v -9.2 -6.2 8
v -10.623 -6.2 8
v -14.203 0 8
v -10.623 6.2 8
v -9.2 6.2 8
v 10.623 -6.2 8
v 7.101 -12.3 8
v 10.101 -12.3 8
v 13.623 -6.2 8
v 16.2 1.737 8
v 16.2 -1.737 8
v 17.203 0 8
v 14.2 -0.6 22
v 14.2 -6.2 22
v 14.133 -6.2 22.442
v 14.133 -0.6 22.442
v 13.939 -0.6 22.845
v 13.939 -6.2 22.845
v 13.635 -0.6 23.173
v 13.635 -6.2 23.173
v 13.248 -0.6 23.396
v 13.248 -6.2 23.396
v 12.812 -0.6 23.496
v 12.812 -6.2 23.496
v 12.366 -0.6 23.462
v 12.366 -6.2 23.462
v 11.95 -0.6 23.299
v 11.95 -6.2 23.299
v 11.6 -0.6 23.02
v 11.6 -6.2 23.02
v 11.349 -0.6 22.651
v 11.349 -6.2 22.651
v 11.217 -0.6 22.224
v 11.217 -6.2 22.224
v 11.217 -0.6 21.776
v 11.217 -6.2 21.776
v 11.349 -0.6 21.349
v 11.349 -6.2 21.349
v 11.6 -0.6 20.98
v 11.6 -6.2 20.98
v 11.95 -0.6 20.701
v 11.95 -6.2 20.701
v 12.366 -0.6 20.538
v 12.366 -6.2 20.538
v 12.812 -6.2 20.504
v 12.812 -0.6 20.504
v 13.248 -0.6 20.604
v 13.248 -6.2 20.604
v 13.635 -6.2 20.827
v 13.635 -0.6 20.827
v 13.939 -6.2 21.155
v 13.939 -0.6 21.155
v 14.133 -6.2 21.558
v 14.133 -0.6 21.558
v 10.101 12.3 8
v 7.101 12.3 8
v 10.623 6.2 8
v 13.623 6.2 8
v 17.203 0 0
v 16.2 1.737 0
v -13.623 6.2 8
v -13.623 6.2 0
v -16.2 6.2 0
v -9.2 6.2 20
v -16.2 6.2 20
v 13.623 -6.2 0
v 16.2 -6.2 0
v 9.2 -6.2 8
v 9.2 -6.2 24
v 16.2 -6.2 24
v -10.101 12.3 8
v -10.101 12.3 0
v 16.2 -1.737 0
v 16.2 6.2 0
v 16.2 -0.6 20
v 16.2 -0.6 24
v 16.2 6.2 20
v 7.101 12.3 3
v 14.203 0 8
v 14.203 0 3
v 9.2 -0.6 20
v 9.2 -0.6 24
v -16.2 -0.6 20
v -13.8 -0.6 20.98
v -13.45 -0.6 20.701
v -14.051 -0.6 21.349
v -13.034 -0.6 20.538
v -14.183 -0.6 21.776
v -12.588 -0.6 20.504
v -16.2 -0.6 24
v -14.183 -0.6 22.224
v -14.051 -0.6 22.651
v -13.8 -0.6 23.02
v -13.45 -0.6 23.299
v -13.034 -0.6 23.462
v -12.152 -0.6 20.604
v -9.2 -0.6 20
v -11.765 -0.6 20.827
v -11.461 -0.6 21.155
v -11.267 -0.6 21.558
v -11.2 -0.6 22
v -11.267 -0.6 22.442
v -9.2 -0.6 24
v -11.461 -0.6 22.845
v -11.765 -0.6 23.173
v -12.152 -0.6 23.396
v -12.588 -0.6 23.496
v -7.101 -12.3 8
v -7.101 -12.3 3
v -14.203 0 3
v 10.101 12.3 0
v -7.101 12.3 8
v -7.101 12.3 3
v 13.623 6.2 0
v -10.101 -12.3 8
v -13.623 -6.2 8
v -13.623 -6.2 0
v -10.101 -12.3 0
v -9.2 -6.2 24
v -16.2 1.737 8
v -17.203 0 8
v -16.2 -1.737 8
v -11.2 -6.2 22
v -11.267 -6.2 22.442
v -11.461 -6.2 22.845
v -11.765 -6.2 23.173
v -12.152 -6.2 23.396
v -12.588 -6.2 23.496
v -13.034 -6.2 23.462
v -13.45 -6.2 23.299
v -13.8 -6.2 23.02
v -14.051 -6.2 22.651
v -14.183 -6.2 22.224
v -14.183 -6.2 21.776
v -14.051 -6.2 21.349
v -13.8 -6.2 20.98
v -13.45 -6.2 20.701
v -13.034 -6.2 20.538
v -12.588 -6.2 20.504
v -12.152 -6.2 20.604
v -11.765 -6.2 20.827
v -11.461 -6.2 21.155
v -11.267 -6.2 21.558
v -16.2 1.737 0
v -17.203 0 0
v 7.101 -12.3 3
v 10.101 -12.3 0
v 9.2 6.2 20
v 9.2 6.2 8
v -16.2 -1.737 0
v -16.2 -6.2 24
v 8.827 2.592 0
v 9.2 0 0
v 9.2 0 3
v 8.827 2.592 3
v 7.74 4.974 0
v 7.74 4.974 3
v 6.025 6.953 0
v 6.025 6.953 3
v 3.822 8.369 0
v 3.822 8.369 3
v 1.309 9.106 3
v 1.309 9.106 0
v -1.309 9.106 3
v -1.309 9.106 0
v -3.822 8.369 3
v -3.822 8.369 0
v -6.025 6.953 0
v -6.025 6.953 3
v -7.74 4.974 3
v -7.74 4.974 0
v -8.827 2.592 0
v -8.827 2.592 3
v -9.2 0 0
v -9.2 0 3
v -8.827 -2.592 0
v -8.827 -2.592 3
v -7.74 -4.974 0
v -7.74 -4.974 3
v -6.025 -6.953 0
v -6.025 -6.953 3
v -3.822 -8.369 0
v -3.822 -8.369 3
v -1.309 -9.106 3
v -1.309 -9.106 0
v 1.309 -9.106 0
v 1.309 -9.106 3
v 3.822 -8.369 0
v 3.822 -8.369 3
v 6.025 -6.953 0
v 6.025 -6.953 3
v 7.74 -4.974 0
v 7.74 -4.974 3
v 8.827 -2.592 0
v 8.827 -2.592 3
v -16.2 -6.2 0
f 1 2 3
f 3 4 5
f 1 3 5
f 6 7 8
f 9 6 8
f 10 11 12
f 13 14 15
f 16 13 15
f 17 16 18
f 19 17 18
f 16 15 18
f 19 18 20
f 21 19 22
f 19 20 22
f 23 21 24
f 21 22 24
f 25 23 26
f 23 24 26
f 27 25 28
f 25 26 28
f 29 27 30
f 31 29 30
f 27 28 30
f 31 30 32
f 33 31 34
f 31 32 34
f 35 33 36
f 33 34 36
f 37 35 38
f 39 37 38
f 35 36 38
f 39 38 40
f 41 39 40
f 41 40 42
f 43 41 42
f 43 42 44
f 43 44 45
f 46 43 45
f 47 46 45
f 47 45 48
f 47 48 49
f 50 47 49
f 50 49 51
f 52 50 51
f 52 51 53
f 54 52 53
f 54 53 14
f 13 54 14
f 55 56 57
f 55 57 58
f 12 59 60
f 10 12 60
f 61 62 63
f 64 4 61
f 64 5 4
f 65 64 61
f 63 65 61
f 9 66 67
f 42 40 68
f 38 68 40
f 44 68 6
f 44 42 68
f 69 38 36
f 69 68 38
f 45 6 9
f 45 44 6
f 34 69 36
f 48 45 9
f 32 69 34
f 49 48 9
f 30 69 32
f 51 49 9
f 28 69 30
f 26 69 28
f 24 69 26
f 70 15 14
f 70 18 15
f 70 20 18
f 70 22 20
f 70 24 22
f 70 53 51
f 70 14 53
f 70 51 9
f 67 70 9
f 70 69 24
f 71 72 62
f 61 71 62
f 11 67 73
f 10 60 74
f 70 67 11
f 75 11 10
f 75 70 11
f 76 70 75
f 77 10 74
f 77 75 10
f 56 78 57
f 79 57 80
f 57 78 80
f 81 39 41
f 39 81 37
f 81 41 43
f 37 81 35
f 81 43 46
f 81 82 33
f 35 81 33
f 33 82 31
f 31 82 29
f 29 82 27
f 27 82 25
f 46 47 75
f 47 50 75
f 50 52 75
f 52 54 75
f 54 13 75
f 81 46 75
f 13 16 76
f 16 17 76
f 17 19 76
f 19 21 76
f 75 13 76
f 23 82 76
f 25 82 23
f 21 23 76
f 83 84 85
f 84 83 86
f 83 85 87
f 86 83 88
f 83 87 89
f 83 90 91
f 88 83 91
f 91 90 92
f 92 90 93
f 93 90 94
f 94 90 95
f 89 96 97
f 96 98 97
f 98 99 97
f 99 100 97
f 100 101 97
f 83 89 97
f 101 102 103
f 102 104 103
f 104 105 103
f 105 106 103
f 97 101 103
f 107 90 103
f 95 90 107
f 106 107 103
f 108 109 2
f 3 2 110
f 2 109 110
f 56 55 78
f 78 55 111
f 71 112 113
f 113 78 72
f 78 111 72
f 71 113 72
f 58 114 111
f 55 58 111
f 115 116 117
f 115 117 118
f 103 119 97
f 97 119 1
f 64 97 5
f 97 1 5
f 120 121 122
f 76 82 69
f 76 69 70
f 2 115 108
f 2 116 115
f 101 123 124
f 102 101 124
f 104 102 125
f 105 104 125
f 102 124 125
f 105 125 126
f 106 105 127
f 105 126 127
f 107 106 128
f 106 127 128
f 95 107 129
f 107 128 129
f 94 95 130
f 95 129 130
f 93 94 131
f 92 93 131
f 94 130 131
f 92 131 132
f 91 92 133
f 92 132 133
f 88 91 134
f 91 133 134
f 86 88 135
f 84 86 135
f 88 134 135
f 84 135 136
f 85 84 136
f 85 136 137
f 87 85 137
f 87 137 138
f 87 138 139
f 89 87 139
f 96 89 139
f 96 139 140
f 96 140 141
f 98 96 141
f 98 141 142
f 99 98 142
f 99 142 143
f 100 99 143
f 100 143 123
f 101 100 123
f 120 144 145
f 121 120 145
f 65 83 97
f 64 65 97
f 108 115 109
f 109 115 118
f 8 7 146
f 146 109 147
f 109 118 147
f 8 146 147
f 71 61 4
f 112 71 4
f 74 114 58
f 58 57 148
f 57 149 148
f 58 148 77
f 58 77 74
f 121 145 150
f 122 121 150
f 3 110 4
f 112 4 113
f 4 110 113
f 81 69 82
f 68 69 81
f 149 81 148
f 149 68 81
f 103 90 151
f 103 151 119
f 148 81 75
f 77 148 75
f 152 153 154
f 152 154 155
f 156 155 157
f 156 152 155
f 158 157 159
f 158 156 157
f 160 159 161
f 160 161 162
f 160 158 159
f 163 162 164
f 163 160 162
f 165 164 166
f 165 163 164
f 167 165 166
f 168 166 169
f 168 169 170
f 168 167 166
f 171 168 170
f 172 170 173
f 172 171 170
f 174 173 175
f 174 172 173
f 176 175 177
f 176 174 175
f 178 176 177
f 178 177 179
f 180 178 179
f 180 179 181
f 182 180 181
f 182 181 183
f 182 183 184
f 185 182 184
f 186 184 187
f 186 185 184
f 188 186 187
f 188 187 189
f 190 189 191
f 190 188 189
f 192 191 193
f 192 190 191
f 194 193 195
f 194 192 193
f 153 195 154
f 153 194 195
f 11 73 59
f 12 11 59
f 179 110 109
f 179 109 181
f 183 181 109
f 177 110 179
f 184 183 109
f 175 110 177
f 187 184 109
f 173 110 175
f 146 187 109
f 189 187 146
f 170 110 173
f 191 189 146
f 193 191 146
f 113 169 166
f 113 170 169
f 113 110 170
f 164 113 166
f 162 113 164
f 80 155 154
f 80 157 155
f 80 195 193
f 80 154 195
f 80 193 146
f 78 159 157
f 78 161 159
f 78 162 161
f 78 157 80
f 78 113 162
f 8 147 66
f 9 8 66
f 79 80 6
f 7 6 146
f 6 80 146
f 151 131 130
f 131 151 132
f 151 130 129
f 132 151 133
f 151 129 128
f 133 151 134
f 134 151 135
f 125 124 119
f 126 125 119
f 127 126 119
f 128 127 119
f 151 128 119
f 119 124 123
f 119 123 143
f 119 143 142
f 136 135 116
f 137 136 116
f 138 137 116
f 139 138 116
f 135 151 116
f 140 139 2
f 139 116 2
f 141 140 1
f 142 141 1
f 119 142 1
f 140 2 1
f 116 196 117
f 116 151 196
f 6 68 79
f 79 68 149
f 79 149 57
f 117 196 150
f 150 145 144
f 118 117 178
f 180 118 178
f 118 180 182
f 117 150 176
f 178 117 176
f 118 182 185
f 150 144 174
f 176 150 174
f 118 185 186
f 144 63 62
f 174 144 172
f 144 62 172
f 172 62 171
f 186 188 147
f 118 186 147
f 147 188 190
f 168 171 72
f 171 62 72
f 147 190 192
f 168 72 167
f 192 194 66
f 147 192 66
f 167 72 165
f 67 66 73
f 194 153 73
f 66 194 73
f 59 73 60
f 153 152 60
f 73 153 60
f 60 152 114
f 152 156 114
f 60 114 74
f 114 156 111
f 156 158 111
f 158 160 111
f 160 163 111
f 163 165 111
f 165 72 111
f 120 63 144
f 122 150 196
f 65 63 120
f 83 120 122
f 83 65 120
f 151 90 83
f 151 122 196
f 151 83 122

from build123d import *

# Parameters (mm, degrees)
F0_R     = 9.2
F1_DEPTH = 3
F2_DEPTH = 8
F3_W     = 7
F3_H     = 12.4
F4_DEPTH = 16
F5_DEPTH = 8
F6_R     = 1.5
F7_DEPTH = 18.501
F8_START = -5.6
F6_W     = 7
F6_H     = 4
F8_DEPTH = 6.8


with BuildPart() as f1:
    # F0 (on Top) → F1 (new body)
    with BuildSketch(Plane.XY):
        Polygon((-7.101408311, -12.3), (-14.2028166221, 0), (-7.101408311, 12.3), (-10.101408311, 12.3), (-17.2028166221, 0), (-10.101408311, -12.3), align=None)
        Polygon((-7.101408311, 12.3), (-14.2028166221, 0), (-7.101408311, -12.3), (7.101408311, -12.3), (14.2028166221, 0), (7.101408311, 12.3), align=None)
        Circle(F0_R, mode=Mode.SUBTRACT)
        Polygon((10.101408311, 12.3), (7.101408311, 12.3), (14.2028166221, 0), (7.101408311, -12.3), (10.101408311, -12.3), (17.2028166221, 0), align=None)
    extrude(amount=F1_DEPTH)

    # F0 (on Top) → F2 (join)
    with BuildSketch(Plane.XY):
        Polygon((-7.101408311, -12.3), (-14.2028166221, 0), (-7.101408311, 12.3), (-10.101408311, 12.3), (-17.2028166221, 0), (-10.101408311, -12.3), align=None)
        Polygon((10.101408311, 12.3), (7.101408311, 12.3), (14.2028166221, 0), (7.101408311, -12.3), (10.101408311, -12.3), (17.2028166221, 0), align=None)
    extrude(amount=F2_DEPTH)

    # F3 (on face) → F4 (join)
    with BuildSketch(Plane.XY.offset(8)):
        Polygon((-16.2, 1.7369293401), (-13.6232449531, 6.2), (-16.2, 6.2), align=None)
        Polygon((-14.2028166221, 0), (-10.6232449531, 6.2), (-13.6232449531, 6.2), (-16.2, 1.7369293401), (-16.2, -1.7369293401), (-13.6232449531, -6.2), (-10.6232449531, -6.2), align=None)
        Polygon((-16.2, -6.2), (-13.6232449531, -6.2), (-16.2, -1.7369293401), align=None)
        Polygon((-9.2, -6.2), (-9.2, 6.2), (-10.6232449531, 6.2), (-14.2028166221, 0), (-10.6232449531, -6.2), align=None)
        with Locations((12.7, 0)):
            Rectangle(F3_W, F3_H)
    extrude(amount=F4_DEPTH)

    # F5 (add, through all): faces of the model
    f5_faces = [f1.faces().sort_by_distance(p)[0] for p in [
        (-15.341081651, 4.71230978, 8),
        (15.341081651, 4.71230978, 8),
        (15.341081651, -4.71230978, 8),
        (-15.341081651, -4.71230978, 8),
    ]]
    extrude(f5_faces, amount=F5_DEPTH)

    # F6 (on face) → F7 (cut, through all)
    with BuildSketch(Plane.XZ.offset(6.2)):
        with Locations((-12.7, 22)):
            Circle(F6_R)
        with Locations((12.7, 22)):
            Circle(F6_R)
    extrude(amount=-F7_DEPTH, mode=Mode.SUBTRACT)

    # F6 (on face) → F8 (cut)
    with BuildSketch(Plane.XZ.offset(6.2).offset(F8_START)):
        with Locations((-12.7, 22)):
            Rectangle(F6_W, F6_H)
        with Locations((-12.7, 22)):
            Circle(F6_R, mode=Mode.SUBTRACT)
        with Locations((12.7, 22)):
            Rectangle(F6_W, F6_H)
        with Locations((12.7, 22)):
            Circle(F6_R, mode=Mode.SUBTRACT)
    extrude(amount=-F8_DEPTH, mode=Mode.SUBTRACT)


solid = f1.part
